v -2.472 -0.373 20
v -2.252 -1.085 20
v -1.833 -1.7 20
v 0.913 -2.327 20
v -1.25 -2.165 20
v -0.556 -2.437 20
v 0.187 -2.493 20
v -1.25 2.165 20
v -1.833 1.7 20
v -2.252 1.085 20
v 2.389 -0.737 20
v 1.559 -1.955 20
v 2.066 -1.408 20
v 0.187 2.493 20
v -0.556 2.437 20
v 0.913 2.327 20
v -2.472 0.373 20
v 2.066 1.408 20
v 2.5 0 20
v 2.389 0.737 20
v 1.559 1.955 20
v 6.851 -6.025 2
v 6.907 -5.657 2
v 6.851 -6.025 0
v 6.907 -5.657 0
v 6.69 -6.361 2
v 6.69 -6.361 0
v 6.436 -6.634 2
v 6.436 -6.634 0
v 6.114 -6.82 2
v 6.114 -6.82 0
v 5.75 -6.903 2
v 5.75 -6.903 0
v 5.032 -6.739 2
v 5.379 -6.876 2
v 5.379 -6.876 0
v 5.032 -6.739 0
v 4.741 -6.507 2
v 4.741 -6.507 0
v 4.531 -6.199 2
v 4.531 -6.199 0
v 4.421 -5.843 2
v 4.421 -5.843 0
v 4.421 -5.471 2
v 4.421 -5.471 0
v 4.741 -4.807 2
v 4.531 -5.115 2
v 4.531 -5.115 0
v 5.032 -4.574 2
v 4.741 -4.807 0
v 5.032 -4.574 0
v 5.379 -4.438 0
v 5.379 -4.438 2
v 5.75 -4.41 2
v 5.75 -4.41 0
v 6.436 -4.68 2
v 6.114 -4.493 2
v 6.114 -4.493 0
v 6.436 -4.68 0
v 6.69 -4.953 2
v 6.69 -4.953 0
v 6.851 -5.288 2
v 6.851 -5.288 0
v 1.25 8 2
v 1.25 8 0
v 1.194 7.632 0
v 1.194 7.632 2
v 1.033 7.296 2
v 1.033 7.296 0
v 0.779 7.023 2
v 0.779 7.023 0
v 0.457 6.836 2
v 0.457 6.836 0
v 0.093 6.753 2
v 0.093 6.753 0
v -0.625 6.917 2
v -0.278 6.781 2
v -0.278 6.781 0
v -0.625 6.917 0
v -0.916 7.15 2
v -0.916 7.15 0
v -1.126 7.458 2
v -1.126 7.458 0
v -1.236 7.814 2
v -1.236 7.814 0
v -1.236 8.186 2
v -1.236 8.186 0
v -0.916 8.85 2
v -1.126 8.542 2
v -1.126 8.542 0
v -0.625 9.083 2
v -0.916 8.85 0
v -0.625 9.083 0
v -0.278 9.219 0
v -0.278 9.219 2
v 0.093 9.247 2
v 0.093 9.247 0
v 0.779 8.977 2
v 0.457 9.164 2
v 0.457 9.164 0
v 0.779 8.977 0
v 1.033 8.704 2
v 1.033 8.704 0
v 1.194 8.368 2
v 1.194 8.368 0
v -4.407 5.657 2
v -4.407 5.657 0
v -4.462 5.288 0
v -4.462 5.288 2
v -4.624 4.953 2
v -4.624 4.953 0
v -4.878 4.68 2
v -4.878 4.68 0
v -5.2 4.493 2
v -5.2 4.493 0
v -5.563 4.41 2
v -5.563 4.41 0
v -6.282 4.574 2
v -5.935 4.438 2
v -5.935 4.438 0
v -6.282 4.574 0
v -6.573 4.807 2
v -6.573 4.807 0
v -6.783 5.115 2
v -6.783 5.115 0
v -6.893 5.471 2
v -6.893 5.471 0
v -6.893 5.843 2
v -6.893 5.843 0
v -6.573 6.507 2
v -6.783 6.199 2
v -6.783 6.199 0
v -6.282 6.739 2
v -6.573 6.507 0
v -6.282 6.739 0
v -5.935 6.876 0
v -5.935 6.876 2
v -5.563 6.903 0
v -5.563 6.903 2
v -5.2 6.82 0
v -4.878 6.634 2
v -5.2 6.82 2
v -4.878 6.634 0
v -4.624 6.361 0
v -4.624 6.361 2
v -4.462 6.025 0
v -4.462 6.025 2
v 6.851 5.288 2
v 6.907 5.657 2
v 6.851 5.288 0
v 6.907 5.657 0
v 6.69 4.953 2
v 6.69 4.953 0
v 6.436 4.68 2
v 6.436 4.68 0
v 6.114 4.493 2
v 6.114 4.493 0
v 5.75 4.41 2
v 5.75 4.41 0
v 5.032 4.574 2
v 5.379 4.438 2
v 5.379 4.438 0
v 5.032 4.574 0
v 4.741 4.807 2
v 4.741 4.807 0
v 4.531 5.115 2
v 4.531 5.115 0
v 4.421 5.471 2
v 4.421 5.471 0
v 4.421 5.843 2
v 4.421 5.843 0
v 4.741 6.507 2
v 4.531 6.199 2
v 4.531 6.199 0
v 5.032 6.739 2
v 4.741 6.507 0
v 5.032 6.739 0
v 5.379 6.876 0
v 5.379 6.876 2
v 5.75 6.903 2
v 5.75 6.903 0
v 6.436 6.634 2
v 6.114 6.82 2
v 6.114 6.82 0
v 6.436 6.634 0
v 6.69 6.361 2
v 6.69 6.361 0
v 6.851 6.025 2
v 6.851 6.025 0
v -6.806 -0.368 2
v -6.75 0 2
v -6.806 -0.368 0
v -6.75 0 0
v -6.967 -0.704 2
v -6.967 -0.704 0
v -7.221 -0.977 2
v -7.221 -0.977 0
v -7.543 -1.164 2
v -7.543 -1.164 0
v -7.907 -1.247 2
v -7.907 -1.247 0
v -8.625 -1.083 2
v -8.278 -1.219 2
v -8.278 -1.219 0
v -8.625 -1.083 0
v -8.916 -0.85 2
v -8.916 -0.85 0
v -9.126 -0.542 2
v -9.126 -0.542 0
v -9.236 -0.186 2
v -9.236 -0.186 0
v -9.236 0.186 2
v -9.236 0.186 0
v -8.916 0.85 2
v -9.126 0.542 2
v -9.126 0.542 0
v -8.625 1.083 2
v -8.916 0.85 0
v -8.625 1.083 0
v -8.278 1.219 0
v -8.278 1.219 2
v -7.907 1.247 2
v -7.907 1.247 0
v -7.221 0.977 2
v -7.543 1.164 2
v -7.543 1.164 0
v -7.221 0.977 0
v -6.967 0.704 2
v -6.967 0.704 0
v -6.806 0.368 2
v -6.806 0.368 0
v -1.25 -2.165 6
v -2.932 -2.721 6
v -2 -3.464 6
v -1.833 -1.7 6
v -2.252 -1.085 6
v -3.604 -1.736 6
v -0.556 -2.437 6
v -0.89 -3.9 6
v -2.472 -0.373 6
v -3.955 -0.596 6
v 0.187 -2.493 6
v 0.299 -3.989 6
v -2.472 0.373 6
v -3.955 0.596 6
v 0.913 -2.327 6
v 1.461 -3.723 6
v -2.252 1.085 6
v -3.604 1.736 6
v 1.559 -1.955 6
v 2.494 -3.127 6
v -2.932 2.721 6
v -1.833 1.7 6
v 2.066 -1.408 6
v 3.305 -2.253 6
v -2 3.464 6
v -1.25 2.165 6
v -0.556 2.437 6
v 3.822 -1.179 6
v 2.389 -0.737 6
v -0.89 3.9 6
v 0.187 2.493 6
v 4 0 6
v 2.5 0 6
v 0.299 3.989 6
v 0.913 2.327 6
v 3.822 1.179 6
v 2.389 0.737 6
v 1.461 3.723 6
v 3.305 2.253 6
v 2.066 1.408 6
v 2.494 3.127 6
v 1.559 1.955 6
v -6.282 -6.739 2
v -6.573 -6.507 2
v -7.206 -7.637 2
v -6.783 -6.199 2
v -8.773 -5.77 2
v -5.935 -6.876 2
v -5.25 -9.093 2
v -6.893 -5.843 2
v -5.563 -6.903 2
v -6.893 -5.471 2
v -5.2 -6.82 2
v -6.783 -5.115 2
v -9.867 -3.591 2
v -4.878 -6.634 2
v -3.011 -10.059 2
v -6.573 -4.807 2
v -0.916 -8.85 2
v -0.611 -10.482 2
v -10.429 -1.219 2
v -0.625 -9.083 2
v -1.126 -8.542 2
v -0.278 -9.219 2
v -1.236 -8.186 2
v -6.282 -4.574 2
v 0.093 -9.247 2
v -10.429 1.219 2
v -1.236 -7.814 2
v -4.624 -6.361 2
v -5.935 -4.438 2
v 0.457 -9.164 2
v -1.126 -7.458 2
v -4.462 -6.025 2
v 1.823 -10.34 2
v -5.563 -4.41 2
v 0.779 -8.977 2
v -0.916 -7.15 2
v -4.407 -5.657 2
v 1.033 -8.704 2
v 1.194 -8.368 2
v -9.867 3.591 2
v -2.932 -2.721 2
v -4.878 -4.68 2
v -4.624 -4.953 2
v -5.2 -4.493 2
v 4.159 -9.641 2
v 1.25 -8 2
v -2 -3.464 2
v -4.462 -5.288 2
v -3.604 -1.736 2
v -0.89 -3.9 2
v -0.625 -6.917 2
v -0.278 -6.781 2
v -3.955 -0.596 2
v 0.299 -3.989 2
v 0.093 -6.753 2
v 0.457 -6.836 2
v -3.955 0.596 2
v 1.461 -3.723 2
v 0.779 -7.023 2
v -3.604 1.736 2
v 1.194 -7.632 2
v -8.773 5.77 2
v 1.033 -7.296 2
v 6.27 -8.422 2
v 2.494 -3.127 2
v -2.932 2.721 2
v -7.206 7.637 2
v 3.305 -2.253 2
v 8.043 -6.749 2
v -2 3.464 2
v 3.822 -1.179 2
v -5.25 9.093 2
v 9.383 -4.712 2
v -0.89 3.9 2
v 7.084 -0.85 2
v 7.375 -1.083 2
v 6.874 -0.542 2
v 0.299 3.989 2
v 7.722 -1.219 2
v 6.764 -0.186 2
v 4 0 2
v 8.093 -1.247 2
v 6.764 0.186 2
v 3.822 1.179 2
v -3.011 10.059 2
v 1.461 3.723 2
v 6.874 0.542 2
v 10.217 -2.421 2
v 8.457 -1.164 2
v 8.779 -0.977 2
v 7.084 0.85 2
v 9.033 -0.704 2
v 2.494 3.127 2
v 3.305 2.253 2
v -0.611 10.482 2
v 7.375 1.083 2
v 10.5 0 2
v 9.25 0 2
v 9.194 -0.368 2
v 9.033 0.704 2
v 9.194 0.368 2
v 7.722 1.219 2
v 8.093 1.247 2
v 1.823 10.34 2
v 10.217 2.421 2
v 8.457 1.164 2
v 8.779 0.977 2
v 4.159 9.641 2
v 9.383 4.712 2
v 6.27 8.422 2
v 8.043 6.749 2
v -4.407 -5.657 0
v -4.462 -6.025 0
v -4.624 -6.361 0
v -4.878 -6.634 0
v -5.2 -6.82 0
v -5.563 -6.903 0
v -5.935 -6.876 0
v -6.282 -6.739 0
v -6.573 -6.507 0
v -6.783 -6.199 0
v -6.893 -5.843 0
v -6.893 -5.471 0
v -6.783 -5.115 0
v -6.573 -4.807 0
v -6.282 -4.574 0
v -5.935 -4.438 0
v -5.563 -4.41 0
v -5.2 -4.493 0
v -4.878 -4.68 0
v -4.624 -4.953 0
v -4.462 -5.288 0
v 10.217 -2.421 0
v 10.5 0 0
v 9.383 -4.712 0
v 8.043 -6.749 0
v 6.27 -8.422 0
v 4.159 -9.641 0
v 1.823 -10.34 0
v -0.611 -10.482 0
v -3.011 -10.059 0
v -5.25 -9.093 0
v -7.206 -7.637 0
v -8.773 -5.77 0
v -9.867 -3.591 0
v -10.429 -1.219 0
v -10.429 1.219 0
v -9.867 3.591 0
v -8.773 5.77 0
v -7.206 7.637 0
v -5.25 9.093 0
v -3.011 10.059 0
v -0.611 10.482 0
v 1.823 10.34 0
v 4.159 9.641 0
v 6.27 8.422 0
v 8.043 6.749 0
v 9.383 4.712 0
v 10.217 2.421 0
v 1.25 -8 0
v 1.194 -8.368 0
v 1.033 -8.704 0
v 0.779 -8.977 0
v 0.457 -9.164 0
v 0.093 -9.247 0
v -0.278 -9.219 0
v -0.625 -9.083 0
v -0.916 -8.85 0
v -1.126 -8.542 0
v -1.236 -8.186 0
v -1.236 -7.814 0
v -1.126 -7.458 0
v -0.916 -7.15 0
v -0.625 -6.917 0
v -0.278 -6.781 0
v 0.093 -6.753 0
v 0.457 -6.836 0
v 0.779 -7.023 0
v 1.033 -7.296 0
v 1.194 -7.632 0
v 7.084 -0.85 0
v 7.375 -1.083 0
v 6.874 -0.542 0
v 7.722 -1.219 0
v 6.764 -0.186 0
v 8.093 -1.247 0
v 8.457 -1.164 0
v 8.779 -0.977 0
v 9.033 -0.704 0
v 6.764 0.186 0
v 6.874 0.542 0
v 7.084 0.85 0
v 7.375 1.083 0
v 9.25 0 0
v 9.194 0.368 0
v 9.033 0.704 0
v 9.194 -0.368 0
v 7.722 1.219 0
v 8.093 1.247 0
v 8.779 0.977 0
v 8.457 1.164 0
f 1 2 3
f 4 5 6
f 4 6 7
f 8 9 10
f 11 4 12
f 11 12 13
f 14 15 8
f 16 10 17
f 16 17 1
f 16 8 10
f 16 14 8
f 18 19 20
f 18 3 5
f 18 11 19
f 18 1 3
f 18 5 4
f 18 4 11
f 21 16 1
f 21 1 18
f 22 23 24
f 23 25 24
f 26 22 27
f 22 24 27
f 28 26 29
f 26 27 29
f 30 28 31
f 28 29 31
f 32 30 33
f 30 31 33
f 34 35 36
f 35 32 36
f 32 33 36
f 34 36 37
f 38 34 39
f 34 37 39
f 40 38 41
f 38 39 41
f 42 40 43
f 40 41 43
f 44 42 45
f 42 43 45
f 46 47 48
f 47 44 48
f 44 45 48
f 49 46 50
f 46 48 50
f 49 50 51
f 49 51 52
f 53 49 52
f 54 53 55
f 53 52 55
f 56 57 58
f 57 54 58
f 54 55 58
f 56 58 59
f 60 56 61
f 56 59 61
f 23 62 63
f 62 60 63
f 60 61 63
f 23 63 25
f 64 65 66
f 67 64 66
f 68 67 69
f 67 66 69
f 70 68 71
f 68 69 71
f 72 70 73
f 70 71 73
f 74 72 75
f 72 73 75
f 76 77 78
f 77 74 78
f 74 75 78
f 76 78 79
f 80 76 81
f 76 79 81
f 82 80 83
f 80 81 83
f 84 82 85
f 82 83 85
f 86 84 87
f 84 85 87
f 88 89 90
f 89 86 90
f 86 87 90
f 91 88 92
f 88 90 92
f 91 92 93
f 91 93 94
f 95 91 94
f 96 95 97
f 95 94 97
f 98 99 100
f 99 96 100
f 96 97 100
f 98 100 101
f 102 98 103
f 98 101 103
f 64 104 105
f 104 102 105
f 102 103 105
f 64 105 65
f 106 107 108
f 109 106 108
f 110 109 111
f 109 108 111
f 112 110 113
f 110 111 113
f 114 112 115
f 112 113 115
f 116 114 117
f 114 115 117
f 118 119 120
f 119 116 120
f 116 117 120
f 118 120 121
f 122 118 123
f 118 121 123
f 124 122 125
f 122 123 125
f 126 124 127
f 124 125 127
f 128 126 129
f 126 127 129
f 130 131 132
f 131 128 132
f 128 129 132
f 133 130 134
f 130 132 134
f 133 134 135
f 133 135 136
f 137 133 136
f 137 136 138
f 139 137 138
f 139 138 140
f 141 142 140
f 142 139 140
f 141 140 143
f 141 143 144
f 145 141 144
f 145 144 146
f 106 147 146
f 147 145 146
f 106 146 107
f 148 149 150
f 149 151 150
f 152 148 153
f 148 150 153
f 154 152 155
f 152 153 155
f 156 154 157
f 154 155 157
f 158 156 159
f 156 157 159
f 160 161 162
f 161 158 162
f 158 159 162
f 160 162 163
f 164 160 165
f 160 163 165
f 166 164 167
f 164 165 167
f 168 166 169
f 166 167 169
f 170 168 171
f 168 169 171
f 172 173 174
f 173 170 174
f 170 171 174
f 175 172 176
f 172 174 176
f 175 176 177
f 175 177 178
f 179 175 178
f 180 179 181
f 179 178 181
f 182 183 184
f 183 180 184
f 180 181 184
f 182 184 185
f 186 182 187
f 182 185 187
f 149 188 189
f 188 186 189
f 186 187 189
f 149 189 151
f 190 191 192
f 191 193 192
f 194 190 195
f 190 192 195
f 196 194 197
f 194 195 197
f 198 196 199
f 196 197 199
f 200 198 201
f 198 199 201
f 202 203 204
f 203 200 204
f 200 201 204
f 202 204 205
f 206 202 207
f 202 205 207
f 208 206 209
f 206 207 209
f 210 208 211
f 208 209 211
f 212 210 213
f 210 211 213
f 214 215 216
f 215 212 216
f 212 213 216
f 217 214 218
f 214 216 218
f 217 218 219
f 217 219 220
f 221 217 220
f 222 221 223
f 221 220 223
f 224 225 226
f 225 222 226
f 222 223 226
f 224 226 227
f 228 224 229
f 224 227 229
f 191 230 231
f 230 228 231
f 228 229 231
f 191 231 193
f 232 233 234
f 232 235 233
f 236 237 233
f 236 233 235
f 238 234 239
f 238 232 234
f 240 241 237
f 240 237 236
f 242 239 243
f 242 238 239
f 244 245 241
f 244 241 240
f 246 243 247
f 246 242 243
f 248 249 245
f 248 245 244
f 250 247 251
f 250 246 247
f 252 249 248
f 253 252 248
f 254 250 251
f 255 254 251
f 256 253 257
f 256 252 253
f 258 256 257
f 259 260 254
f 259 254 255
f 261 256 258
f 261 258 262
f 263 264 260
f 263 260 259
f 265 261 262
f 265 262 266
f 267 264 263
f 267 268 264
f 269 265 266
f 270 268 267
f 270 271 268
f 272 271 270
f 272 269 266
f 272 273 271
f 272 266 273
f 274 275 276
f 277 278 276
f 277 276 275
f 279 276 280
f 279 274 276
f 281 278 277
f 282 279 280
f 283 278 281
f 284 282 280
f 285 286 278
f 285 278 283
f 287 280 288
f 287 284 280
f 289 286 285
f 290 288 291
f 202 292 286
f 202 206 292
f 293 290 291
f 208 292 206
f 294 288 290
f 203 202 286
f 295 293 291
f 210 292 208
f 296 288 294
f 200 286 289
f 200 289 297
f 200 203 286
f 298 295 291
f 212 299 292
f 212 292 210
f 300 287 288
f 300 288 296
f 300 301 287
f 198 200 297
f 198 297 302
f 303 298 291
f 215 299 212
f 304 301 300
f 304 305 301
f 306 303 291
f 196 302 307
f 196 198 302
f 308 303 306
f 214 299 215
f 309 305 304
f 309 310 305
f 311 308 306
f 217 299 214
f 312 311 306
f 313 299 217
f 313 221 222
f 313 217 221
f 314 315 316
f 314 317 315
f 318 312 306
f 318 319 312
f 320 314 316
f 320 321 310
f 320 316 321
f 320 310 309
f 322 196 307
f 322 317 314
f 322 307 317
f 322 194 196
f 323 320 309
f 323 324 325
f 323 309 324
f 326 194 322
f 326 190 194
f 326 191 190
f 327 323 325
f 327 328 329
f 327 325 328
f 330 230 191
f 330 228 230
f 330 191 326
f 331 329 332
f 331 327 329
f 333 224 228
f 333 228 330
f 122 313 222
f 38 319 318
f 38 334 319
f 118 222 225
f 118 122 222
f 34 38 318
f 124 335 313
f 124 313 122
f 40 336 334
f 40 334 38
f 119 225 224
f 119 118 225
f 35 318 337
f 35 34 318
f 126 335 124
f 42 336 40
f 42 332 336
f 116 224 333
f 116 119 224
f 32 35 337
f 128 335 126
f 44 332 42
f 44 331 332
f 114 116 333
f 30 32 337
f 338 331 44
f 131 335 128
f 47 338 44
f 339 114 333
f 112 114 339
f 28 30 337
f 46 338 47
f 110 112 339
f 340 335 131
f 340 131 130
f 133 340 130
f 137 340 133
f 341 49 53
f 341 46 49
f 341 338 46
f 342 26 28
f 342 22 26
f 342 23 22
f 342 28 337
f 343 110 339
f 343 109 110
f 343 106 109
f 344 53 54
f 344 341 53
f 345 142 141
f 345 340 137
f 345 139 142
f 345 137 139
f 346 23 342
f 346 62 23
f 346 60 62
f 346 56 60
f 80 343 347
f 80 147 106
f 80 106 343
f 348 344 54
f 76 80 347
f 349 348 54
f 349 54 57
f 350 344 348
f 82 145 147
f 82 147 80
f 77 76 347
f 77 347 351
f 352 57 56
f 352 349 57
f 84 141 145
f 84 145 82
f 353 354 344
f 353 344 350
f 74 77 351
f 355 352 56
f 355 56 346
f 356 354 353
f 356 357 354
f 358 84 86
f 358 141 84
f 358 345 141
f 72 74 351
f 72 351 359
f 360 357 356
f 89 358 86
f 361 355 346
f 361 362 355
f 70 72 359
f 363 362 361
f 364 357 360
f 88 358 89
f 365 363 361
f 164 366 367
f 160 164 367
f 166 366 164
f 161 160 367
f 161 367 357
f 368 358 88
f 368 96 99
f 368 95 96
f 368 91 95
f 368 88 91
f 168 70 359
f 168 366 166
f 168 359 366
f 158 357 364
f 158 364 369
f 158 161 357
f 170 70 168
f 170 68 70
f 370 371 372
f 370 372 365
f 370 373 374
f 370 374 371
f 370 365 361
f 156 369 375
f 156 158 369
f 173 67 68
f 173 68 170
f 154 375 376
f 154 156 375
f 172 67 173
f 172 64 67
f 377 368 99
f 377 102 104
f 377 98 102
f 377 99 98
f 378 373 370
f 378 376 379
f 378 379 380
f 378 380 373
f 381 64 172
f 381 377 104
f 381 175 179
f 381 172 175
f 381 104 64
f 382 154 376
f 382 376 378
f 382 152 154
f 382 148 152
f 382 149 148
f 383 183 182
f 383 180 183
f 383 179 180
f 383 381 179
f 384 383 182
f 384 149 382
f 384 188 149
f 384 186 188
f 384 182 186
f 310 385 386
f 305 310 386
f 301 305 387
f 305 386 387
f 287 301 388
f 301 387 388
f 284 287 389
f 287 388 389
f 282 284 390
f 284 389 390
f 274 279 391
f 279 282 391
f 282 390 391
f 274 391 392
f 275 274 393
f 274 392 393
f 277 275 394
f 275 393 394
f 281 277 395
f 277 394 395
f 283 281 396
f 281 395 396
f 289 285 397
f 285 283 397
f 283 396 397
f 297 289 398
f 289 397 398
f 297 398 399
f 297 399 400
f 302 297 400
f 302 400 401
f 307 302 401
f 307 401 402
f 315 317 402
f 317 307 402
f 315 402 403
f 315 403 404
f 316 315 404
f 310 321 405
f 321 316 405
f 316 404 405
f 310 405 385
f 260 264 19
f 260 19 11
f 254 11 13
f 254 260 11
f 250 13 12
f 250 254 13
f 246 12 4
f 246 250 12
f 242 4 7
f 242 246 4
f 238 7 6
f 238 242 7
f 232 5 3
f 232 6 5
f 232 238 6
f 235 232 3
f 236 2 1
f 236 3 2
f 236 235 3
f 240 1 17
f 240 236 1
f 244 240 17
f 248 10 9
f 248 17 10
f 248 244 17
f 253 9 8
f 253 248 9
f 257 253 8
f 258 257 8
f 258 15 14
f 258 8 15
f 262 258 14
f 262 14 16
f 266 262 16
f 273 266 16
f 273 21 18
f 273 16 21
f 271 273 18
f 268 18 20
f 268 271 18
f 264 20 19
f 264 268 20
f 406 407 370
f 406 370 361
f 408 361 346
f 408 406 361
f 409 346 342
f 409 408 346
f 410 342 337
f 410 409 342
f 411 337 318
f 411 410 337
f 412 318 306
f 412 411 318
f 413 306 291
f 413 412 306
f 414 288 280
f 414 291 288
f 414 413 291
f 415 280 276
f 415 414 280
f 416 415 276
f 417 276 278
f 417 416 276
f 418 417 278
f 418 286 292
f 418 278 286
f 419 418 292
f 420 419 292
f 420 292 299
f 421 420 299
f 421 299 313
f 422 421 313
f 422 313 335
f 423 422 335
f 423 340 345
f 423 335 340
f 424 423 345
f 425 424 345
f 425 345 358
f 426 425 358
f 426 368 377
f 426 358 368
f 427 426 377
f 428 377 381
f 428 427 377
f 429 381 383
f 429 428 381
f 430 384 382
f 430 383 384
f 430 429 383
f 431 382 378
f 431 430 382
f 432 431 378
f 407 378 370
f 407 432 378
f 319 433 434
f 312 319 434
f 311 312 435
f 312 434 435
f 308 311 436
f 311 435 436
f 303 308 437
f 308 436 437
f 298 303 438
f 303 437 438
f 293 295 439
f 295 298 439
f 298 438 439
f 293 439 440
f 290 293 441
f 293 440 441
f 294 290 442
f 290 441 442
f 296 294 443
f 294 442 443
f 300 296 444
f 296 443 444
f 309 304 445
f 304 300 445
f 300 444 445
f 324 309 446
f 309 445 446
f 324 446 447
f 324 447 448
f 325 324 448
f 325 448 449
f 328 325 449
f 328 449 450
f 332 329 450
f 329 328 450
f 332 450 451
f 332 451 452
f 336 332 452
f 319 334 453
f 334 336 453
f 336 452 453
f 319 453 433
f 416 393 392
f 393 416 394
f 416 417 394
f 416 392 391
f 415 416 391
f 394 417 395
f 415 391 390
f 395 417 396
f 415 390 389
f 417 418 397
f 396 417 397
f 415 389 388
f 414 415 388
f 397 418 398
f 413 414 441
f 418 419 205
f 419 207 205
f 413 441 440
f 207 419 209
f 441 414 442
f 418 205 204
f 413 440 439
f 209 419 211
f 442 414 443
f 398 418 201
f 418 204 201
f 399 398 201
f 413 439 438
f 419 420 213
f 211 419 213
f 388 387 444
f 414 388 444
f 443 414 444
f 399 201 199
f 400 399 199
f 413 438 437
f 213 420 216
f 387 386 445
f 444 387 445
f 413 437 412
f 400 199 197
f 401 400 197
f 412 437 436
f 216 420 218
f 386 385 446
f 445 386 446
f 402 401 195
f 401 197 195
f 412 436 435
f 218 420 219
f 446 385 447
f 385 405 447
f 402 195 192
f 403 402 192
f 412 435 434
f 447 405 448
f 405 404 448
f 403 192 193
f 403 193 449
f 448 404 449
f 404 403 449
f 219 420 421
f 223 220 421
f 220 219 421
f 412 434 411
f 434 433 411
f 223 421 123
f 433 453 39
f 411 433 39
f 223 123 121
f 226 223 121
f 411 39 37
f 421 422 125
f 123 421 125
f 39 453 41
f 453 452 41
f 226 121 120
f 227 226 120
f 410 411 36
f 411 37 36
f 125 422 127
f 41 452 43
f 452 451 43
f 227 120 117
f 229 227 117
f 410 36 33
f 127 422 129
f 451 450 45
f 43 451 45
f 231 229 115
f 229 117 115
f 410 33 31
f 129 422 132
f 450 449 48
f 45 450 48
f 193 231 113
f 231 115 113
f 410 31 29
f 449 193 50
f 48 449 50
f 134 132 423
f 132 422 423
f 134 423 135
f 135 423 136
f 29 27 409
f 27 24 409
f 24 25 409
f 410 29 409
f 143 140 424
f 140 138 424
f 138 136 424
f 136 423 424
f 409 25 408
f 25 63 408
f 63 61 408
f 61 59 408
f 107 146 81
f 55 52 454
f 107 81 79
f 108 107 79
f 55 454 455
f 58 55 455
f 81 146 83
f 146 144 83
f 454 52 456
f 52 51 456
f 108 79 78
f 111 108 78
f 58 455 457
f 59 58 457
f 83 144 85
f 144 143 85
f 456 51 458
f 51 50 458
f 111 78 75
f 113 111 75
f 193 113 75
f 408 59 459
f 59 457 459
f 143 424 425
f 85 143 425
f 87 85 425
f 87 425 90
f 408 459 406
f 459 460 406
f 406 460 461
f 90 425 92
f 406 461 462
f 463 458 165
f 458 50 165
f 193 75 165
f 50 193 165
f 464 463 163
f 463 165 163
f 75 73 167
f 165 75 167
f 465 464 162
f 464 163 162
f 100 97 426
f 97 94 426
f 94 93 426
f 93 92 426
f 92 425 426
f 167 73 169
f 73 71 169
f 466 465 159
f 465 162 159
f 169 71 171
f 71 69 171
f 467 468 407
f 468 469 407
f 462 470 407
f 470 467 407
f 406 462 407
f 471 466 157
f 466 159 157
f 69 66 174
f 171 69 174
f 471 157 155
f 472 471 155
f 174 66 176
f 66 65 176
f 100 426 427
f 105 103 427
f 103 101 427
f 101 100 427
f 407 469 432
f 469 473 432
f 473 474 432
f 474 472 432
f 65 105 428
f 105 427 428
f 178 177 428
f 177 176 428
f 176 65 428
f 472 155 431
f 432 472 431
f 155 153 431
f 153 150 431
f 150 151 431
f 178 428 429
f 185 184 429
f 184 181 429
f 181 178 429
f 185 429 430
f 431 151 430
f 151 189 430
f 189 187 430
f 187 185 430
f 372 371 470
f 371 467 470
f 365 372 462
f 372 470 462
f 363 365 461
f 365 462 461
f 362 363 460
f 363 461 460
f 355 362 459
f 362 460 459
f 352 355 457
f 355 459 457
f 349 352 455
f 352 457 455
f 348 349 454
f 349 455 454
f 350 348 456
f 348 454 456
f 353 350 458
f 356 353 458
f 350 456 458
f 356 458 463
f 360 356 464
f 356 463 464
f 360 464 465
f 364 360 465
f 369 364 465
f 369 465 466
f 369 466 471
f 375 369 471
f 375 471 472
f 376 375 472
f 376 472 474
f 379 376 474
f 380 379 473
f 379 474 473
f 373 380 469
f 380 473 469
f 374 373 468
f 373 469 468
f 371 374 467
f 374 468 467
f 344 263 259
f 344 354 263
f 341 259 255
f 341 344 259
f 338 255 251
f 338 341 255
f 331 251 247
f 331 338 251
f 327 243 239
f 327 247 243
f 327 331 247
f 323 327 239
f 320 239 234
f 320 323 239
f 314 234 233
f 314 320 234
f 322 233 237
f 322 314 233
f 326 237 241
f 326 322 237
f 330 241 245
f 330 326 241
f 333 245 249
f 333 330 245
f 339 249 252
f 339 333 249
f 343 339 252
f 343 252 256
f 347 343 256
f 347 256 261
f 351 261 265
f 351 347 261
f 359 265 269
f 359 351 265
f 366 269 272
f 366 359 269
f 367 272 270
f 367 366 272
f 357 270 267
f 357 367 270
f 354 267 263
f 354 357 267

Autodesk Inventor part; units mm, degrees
ref_plane "YZ Plane" through (0, 0, 0) normal (1, 0, 0) x (0, 1, 0)
ref_plane "XZ Plane" through (0, 0, 0) normal (0, 1, 0) x (-1, 0, 0)
ref_plane "XY Plane" through (0, 0, 0) normal (0, 0, 1) x (1, 0, 0)
sketch "Sketch1" plane through (0, 0, 0) normal (0, 0, 1) x (1, 0, 0)
  circle A0 centre (0, 0) radius 10.5
  line L0 (0, 0) -> (8, 0)
  circle A1 centre (8, 0) radius 1.25
  circle A2 centre (5.6569, 5.6569) radius 1.25
  circle A3 centre (0, 8) radius 1.25
  circle A4 centre (-5.6569, 5.6569) radius 1.25
  circle A5 centre (-8, 0) radius 1.25
  circle A6 centre (-5.6569, -5.6569) radius 1.25
  circle A7 centre (0, -8) radius 1.25
  circle A8 centre (5.6569, -5.6569) radius 1.25
  dimension "d0" = 21
  dimension "d1" = 8
  dimension "d2" = 2.5
  dimension "d5" = 360
extrude "Extrusion1" add sketch "Sketch1" along normal blind 2
sketch "Sketch2" plane through (0, 0, 2) normal (0, 0, 1) x (1, 0, 0)
  circle A0 centre (0, 0) radius 2.5
  dimension "d9" = 5
extrude "Extrusion3" add sketch "Sketch2" along normal blind 18
sketch "Sketch3" plane through (0, 0, 2) normal (0, 0, 1) x (1, 0, 0)
  circle A0 centre (0, 0) radius 2.5 projected
  circle A1 centre (0, 0) radius 4
  dimension "d14" = 8
extrude "Extrusion4" add sketch "Sketch3" along normal blind 4
properties part number "Drive_shaft2"
